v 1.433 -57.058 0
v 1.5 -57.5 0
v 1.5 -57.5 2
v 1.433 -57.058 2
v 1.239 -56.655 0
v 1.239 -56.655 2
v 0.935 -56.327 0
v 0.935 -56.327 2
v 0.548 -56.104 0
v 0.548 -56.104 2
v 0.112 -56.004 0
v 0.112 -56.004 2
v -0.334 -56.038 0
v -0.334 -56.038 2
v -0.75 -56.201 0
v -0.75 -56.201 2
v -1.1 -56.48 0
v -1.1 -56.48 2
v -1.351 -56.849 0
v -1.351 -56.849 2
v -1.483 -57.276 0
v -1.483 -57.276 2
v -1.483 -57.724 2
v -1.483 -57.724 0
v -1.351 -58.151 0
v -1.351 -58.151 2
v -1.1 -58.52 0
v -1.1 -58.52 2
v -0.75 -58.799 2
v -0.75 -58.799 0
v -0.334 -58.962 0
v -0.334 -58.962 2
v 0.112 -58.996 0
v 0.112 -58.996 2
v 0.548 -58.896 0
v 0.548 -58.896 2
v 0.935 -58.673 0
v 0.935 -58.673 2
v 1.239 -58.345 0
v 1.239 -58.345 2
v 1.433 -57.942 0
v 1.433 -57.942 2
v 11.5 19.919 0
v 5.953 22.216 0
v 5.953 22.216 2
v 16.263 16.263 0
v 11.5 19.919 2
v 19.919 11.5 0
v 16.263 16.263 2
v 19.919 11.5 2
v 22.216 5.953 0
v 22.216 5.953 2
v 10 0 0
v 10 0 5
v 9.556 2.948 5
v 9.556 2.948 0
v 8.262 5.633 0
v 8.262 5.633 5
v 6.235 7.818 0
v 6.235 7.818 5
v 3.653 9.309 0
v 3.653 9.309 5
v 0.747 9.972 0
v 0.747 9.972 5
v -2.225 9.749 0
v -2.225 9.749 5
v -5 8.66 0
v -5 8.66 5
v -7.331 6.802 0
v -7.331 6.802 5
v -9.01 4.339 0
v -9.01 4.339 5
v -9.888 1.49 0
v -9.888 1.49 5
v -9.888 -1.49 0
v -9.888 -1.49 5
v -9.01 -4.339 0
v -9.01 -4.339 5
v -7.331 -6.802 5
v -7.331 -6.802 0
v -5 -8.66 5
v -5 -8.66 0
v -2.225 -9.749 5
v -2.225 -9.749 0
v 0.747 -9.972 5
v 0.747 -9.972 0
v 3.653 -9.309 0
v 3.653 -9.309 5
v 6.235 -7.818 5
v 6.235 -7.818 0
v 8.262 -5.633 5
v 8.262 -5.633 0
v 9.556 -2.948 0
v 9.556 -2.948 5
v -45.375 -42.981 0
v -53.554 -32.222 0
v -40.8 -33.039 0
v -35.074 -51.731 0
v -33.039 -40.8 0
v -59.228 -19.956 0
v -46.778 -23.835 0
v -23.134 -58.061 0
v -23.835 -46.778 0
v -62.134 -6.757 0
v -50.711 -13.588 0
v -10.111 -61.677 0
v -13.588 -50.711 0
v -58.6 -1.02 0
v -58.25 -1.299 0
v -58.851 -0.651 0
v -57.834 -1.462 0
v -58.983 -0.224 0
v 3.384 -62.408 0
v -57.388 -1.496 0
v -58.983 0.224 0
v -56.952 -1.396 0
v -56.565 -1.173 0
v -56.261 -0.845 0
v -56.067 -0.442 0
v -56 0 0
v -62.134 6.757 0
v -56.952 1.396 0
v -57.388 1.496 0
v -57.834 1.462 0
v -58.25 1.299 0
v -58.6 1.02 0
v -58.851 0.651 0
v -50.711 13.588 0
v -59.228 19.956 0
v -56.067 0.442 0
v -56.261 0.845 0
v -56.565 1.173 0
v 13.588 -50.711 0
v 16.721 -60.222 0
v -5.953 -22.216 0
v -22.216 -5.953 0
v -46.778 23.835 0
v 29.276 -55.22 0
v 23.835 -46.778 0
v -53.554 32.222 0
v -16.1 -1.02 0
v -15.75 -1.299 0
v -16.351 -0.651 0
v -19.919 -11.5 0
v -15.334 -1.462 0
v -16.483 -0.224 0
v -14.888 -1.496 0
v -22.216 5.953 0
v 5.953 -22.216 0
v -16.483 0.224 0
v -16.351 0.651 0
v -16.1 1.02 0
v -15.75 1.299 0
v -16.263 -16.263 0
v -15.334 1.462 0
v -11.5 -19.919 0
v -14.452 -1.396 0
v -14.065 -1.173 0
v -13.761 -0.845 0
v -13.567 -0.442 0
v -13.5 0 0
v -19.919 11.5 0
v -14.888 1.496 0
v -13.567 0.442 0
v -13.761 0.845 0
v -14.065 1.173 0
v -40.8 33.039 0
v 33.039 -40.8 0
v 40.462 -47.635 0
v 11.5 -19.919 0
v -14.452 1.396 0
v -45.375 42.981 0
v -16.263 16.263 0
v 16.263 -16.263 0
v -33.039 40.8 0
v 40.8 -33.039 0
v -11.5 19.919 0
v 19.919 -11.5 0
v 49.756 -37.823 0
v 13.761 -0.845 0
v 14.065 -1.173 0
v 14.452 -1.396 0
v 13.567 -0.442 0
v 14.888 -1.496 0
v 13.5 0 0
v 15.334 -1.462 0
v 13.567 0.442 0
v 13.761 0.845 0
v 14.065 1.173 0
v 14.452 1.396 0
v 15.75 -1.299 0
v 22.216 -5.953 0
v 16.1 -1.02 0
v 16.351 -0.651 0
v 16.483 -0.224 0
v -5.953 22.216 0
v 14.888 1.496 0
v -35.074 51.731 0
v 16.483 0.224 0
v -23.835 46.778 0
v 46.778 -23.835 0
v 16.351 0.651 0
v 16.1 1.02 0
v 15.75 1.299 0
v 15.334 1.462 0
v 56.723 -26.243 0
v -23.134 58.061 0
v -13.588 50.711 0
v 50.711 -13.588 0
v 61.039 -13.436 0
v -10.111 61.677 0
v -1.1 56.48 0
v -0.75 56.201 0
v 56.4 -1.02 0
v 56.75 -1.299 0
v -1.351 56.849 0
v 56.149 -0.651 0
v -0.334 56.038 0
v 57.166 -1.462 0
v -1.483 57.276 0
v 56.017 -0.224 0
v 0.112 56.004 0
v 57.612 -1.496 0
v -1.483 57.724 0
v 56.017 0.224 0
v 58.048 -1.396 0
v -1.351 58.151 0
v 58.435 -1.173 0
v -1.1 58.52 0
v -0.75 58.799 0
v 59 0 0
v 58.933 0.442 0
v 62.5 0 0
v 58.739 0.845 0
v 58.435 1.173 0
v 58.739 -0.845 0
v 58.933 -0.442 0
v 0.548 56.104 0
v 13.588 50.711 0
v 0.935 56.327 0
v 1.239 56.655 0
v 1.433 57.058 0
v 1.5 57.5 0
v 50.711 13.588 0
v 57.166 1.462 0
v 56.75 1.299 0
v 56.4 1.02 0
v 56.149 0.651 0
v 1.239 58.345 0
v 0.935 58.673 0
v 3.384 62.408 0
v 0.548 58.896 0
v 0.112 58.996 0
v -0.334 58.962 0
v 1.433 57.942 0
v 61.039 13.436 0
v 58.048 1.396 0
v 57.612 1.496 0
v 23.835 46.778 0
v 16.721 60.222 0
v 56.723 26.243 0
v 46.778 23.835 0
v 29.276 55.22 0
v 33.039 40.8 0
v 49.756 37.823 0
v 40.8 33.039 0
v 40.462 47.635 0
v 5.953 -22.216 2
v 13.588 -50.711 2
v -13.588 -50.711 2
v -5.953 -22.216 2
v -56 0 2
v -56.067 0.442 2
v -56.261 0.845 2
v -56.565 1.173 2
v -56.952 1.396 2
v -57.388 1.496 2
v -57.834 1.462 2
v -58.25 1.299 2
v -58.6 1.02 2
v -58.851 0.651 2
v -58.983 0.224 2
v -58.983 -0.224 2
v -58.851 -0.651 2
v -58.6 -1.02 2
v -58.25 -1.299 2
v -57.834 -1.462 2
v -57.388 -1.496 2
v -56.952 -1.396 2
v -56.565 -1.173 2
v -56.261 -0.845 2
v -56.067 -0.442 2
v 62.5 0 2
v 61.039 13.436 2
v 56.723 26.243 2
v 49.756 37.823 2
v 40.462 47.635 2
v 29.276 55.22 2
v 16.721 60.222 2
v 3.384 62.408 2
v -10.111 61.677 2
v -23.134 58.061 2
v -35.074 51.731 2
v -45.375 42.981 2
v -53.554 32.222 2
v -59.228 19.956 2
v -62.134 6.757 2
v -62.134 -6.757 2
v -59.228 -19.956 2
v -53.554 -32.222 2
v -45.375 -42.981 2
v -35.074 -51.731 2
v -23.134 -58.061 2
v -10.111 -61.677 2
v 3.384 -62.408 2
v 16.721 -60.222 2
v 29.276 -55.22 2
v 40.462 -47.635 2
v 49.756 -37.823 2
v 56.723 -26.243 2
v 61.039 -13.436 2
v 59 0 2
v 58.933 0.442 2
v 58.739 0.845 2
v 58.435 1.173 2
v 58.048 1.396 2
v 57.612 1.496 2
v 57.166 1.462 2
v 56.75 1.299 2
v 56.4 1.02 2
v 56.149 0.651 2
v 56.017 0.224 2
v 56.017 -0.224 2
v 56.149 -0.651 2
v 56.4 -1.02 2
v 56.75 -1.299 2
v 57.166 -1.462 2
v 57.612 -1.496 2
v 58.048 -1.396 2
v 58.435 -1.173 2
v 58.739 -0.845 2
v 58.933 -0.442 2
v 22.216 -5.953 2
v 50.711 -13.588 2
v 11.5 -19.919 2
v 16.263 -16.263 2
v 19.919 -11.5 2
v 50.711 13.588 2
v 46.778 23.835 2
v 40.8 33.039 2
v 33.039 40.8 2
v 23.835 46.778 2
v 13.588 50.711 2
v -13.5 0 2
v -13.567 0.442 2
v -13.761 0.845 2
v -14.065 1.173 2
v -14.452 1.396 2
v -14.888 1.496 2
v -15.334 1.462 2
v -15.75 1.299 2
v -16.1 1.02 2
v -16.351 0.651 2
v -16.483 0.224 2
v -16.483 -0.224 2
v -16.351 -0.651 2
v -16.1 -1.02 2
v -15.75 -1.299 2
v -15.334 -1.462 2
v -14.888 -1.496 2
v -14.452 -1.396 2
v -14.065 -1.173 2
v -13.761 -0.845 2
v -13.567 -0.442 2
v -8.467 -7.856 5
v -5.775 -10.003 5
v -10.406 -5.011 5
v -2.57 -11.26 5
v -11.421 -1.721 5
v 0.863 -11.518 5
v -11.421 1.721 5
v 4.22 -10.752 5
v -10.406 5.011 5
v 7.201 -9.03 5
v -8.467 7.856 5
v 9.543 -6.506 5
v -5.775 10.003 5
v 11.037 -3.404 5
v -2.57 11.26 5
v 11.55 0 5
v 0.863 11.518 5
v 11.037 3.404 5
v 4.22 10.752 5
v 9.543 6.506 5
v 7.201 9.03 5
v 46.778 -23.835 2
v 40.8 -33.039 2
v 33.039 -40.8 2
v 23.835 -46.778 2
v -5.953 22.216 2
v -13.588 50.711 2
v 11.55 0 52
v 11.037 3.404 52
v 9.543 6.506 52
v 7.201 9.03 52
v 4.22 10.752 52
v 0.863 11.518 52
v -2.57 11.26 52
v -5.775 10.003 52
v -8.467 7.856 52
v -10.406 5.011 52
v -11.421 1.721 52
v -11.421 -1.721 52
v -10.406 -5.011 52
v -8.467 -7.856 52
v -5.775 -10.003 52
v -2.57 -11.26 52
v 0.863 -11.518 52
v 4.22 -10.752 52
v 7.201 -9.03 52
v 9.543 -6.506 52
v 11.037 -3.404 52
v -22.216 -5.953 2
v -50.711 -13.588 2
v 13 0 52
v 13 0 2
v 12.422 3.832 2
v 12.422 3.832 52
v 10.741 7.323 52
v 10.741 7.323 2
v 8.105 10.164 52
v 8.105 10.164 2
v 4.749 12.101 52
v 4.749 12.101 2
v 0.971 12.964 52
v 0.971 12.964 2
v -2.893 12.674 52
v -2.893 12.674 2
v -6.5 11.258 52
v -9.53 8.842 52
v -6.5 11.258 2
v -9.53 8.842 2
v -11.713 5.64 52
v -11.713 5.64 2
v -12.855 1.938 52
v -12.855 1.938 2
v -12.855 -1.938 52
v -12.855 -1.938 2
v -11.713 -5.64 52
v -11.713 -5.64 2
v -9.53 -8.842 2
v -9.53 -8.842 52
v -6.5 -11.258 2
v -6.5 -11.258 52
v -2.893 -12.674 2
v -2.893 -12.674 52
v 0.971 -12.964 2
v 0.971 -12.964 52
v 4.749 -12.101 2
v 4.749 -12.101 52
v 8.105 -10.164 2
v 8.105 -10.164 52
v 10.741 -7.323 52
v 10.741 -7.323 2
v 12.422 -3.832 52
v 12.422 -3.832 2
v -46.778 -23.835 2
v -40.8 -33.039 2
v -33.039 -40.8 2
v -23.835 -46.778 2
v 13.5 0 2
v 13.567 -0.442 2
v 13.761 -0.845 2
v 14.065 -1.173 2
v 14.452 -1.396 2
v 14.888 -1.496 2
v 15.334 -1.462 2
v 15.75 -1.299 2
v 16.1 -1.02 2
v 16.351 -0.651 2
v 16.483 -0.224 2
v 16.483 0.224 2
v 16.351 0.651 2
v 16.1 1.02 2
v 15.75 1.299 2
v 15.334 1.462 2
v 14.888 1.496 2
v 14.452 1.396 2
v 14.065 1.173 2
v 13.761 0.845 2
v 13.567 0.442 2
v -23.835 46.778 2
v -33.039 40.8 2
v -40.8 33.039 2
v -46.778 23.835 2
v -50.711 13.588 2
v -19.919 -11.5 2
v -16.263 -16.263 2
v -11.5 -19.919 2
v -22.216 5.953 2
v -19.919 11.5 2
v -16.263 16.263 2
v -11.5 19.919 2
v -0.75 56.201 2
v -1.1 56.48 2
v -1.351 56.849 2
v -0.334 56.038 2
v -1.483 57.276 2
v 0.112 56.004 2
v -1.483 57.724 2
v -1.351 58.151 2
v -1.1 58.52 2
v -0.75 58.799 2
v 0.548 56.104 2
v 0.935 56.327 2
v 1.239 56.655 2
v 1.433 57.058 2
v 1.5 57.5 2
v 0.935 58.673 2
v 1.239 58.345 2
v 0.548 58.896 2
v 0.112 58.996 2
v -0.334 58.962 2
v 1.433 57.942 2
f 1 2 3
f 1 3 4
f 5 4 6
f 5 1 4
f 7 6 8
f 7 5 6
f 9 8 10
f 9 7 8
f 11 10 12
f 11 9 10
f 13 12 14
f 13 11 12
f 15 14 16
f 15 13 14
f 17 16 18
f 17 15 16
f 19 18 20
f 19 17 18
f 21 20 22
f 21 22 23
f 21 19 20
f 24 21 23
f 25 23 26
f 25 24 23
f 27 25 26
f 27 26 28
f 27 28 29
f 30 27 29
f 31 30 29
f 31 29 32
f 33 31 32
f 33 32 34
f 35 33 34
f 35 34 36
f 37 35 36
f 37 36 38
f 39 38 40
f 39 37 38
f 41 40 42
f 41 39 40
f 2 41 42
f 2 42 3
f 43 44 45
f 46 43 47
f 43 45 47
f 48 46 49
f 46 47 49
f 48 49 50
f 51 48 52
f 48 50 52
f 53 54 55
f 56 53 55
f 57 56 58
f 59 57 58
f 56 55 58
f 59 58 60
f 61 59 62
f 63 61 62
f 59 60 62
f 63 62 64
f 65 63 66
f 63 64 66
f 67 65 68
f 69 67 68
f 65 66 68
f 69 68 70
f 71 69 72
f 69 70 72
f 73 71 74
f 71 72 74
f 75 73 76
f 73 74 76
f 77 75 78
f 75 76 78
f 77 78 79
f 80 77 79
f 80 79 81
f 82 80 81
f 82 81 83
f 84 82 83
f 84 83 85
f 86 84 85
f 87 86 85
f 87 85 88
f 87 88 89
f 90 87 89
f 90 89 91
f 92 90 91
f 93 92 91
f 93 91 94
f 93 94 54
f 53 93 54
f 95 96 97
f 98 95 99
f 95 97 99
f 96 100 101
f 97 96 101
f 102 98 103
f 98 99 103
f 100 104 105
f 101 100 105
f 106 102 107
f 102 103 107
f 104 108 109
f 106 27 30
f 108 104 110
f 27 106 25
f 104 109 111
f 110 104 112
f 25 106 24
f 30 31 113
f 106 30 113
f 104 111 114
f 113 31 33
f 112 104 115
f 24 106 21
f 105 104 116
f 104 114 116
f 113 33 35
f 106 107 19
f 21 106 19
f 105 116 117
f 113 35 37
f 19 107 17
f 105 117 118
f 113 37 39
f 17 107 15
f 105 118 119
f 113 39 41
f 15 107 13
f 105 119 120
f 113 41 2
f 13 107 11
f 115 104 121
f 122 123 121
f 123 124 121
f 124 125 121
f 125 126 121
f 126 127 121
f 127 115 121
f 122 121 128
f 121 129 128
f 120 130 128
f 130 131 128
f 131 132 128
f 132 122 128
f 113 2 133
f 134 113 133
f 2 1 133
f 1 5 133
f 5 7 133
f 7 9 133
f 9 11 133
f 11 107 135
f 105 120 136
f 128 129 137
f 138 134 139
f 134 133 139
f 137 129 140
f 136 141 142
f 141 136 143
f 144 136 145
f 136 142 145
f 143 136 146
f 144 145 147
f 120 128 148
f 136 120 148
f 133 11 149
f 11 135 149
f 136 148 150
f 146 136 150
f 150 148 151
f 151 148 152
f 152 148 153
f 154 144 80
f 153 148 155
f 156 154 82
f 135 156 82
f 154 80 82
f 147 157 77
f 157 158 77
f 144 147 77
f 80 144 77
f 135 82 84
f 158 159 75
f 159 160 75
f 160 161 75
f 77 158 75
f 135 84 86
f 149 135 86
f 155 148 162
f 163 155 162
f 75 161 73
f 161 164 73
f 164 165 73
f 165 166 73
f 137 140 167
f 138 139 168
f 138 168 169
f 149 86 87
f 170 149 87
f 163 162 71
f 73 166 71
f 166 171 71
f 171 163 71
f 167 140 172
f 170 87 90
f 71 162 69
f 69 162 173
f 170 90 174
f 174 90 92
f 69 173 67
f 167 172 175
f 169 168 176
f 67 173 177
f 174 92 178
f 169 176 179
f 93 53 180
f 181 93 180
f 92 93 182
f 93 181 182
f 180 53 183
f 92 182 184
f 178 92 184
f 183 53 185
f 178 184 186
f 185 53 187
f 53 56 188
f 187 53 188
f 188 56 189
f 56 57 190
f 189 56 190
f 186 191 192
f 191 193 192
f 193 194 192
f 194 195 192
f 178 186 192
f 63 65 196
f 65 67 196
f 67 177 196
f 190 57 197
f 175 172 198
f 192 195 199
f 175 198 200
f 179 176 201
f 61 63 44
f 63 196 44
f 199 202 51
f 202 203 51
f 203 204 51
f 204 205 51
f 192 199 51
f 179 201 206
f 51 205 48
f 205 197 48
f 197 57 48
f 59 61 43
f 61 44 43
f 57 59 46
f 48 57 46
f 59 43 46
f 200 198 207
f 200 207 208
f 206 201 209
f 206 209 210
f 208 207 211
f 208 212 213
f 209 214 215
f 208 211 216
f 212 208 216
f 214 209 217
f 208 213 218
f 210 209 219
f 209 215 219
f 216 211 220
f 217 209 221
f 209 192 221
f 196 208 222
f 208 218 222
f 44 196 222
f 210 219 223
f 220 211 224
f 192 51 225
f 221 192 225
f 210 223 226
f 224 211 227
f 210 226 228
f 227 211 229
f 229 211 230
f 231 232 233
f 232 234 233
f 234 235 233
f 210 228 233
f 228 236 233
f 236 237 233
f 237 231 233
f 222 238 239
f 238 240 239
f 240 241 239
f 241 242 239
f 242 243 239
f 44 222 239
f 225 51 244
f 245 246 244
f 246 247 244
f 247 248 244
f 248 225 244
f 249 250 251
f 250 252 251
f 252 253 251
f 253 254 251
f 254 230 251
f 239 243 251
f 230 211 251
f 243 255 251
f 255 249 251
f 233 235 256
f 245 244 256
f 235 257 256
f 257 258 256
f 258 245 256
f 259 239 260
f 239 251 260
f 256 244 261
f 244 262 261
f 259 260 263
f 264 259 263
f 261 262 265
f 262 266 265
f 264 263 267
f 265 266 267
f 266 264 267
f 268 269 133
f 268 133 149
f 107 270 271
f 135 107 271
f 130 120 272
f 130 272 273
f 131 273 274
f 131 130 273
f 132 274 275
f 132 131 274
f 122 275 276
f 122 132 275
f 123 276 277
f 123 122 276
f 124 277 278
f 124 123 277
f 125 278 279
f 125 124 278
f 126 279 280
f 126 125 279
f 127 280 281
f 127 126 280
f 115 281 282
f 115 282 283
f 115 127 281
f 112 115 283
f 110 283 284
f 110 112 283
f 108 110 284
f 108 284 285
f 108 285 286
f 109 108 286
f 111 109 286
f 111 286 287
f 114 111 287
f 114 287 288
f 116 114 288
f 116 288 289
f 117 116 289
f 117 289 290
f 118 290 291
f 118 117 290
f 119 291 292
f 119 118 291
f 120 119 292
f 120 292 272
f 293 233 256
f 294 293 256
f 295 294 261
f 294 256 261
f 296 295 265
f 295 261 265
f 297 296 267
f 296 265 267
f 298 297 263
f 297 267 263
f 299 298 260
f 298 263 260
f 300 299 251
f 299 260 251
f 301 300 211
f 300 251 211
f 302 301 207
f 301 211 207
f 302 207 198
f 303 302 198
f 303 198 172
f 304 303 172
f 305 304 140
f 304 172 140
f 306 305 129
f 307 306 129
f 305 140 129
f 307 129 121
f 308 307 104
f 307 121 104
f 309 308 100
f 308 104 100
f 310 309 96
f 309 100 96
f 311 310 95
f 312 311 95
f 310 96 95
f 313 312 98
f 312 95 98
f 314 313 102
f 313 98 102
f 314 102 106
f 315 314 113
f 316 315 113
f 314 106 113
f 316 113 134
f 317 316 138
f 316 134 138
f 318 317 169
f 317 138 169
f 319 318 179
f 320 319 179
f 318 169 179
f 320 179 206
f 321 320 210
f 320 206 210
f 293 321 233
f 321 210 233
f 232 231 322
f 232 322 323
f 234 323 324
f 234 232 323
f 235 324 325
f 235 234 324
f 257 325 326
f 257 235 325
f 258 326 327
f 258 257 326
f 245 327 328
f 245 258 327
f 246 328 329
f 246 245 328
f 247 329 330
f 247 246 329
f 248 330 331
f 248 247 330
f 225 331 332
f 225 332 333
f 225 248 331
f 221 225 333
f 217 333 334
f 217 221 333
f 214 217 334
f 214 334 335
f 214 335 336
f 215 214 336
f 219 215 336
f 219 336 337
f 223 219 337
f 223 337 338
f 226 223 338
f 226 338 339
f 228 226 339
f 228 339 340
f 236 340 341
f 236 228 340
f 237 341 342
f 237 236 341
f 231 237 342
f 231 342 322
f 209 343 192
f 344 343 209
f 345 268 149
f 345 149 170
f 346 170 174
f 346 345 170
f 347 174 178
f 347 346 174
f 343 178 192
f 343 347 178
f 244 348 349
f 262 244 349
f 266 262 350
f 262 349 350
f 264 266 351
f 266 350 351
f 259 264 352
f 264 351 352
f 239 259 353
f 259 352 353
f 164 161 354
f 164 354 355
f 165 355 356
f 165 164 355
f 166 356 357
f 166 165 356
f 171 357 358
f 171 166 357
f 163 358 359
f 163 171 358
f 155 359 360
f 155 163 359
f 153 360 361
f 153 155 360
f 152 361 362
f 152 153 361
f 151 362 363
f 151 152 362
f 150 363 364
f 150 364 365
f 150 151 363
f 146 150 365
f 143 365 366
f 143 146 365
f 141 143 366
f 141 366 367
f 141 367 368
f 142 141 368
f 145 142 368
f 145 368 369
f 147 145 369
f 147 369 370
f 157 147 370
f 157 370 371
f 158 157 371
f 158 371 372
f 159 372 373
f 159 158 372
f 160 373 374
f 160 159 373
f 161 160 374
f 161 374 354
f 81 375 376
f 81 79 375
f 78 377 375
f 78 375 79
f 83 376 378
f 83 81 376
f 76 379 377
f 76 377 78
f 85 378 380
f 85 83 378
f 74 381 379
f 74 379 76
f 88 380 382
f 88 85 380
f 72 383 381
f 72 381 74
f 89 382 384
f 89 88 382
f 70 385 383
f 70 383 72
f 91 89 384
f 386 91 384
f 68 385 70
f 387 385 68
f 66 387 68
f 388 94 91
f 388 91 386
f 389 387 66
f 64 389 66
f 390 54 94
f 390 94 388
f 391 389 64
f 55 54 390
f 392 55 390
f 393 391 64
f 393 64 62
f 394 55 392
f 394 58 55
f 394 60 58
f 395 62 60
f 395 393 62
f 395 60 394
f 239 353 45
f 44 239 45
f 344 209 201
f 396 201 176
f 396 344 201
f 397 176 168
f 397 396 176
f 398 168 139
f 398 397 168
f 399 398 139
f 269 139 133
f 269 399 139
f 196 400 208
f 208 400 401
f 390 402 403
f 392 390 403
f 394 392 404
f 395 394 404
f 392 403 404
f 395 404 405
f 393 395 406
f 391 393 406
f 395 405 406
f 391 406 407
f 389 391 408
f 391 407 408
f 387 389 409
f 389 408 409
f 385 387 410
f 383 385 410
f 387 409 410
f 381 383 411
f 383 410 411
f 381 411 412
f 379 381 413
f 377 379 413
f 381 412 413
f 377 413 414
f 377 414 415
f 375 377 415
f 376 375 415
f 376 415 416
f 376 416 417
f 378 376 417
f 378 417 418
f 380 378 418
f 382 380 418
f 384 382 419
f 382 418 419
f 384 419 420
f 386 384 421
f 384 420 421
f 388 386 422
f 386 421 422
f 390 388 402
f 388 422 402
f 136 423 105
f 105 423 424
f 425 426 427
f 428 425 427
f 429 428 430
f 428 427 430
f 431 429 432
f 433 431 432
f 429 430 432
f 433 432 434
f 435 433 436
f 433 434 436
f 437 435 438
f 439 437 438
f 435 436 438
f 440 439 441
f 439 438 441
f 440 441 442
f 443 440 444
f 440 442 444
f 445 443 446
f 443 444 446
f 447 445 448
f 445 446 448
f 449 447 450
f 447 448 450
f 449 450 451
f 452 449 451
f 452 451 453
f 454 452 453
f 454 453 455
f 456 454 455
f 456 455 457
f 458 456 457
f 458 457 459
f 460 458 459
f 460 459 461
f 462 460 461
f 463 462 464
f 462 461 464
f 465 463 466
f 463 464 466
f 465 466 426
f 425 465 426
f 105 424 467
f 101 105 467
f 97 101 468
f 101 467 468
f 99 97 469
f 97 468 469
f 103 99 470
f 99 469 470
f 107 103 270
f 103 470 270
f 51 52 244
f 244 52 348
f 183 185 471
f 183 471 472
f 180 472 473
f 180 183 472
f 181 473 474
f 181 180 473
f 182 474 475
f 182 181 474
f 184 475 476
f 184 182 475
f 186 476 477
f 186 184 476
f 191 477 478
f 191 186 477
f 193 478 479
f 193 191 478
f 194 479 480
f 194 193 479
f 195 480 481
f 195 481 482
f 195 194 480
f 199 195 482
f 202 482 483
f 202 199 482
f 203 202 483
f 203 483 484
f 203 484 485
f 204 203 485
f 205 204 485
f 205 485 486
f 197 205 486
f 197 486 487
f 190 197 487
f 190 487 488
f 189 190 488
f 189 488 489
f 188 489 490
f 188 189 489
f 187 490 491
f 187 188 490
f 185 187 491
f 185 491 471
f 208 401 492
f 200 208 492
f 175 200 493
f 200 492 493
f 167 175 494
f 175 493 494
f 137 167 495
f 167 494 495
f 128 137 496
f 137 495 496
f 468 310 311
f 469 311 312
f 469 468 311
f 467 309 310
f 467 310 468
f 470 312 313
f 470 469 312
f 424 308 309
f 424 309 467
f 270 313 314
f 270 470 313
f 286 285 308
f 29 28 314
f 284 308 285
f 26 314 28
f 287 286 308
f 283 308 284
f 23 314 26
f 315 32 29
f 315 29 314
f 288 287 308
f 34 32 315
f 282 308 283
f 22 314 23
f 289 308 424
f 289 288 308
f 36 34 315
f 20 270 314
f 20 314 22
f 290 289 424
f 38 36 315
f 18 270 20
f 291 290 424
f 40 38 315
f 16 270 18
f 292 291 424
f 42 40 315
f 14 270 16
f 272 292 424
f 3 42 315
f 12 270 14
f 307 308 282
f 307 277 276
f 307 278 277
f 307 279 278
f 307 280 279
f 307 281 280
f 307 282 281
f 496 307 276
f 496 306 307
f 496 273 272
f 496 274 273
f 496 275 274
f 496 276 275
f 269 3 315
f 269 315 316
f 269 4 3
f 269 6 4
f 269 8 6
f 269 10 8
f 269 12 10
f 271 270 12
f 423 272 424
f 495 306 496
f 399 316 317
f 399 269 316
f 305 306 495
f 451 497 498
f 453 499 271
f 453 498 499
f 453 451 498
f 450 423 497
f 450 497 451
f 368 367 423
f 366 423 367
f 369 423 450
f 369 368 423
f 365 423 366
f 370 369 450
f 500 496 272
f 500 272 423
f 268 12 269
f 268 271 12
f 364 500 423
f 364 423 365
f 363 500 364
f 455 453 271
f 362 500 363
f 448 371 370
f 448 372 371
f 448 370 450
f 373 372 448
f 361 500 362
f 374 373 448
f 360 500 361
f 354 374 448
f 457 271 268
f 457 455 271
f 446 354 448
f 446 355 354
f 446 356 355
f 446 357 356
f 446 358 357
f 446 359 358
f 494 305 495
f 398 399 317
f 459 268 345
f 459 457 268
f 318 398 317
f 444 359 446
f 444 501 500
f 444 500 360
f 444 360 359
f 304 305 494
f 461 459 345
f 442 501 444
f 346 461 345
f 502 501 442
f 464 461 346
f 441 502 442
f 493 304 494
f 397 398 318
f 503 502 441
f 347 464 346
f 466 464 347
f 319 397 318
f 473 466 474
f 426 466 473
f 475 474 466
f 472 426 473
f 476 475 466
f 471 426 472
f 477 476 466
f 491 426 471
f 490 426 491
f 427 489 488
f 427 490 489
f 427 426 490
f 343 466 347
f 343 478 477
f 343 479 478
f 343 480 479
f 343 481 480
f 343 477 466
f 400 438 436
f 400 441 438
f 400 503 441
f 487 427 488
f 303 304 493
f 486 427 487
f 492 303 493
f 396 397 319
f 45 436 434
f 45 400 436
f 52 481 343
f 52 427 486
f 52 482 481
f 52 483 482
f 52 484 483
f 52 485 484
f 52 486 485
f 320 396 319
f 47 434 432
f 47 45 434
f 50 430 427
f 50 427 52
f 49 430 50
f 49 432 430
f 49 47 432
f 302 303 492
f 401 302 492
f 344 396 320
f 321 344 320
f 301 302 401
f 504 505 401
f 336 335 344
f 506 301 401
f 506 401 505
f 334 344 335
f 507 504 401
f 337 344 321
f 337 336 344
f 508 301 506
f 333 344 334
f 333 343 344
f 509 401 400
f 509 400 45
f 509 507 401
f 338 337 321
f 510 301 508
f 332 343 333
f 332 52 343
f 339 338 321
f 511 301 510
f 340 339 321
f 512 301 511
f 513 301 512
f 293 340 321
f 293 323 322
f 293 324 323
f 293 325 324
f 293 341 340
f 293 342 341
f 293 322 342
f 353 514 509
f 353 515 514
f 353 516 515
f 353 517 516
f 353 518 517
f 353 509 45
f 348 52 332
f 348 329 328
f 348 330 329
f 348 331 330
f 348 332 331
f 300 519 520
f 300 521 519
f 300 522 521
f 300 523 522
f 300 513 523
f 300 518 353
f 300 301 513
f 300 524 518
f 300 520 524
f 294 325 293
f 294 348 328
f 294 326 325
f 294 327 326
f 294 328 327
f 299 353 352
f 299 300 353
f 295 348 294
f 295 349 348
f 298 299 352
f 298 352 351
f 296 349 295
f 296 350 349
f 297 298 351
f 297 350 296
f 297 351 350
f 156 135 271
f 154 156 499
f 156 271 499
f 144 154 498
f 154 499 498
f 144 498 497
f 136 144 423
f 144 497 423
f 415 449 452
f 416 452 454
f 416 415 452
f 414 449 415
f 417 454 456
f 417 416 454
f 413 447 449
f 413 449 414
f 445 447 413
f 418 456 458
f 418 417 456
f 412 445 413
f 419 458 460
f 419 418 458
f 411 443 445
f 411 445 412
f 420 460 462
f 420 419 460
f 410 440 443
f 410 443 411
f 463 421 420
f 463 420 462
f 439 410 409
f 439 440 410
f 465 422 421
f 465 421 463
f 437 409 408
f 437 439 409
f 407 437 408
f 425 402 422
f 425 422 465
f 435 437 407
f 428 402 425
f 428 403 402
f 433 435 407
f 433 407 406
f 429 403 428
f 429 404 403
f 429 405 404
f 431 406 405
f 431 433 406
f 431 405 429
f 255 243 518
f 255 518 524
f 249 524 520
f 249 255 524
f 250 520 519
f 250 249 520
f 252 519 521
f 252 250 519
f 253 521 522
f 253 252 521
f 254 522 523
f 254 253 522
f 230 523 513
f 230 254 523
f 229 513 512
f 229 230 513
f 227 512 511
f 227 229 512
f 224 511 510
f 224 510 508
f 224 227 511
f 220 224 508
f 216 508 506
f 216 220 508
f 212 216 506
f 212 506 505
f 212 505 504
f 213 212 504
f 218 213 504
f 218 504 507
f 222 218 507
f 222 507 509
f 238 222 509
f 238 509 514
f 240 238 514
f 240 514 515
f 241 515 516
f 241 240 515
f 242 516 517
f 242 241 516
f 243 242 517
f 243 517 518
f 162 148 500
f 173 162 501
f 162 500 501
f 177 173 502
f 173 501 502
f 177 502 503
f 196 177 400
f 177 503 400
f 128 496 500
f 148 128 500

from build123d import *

# Parameters (mm, degrees)
SKETCH1_R           = 62.5
SKETCH1_R_2         = 1.5
BOSS_EXTRUDE1_DEPTH = 2
SKETCH2_R           = 13
BOSS_EXTRUDE2_DEPTH = 50
SKETCH6_R           = 11.55
CUT_EXTRUDE7_DEPTH  = 47
SKETCH7_R           = 10
CUT_EXTRUDE8_DEPTH  = 101.107442281
CUT_EXTRUDE9_DEPTH  = 102.550480058


with BuildPart() as part:
    # Sketch1 → Boss-Extrude1 (new body)
    with BuildSketch(Plane.XY):
        Circle(SKETCH1_R)
        with Locations((-57.5, 0)):
            Circle(SKETCH1_R_2, mode=Mode.SUBTRACT)
        with Locations((0, 57.5)):
            Circle(SKETCH1_R_2, mode=Mode.SUBTRACT)
        with Locations((57.5, 0)):
            Circle(SKETCH1_R_2, mode=Mode.SUBTRACT)
        with Locations((0, -57.5)):
            Circle(SKETCH1_R_2, mode=Mode.SUBTRACT)
        with Locations((-15, 0)):
            Circle(SKETCH1_R_2, mode=Mode.SUBTRACT)
        with Locations(Location((15, 0, 0), (0, 0, 180))):
            Circle(SKETCH1_R_2, mode=Mode.SUBTRACT)
    extrude(amount=BOSS_EXTRUDE1_DEPTH)

    # Sketch2 → Boss-Extrude2 (add)
    with BuildSketch(Plane.XY.offset(2)):
        Circle(SKETCH2_R)
    extrude(amount=BOSS_EXTRUDE2_DEPTH)

    # Sketch6 → Cut-Extrude7 (cut)
    with BuildSketch(Plane.XY.offset(52)):
        Circle(SKETCH6_R)
    extrude(amount=-CUT_EXTRUDE7_DEPTH, mode=Mode.SUBTRACT)

    # Sketch7 → Cut-Extrude8 (cut, through all)
    with BuildSketch(Plane.XY.offset(5)):
        Circle(SKETCH7_R)
    extrude(amount=-CUT_EXTRUDE8_DEPTH, mode=Mode.SUBTRACT)

    # Sector (Cut Extrude) → Cut-Extrude9 (cut, through all)
    with BuildSketch(Plane.XY.offset(2)):
        with BuildLine():
            Line((22.216294005, -5.952838037), (50.71110588, -13.587999868))
            ThreePointArc((50.71110588, -13.587999868), (37.123106012, -37.123106012), (13.587999868, -50.71110588))
            Line((13.587999868, -50.71110588), (5.952838037, -22.216294005))
            ThreePointArc((5.952838037, -22.216294005), (16.263455967, -16.263455967), (22.216294005, -5.952838037))
        make_face()
        with BuildLine():
            Line((-22.216294005, -5.952838037), (-50.71110588, -13.587999868))
            ThreePointArc((-50.71110588, -13.587999868), (-37.123106012, -37.123106012), (-13.587999868, -50.71110588))
            Line((-13.587999868, -50.71110588), (-5.952838037, -22.216294005))
            ThreePointArc((-5.952838037, -22.216294005), (-16.263455967, -16.263455967), (-22.216294005, -5.952838037))
        make_face()
        with BuildLine():
            Line((-5.952838037, 22.216294005), (-13.587999868, 50.71110588))
            ThreePointArc((-13.587999868, 50.71110588), (-37.123106012, 37.123106012), (-50.71110588, 13.587999868))
            Line((-50.71110588, 13.587999868), (-22.216294005, 5.952838037))
            ThreePointArc((-22.216294005, 5.952838037), (-16.263455967, 16.263455967), (-5.952838037, 22.216294005))
        make_face()
        with BuildLine():
            Line((22.216294005, 5.952838037), (50.71110588, 13.587999868))
            ThreePointArc((50.71110588, 13.587999868), (37.123106012, 37.123106012), (13.587999868, 50.71110588))
            Line((13.587999868, 50.71110588), (5.952838037, 22.216294005))
            ThreePointArc((5.952838037, 22.216294005), (16.263455967, 16.263455967), (22.216294005, 5.952838037))
        make_face()
    extrude(amount=-CUT_EXTRUDE9_DEPTH, mode=Mode.SUBTRACT)


solid = part.part
